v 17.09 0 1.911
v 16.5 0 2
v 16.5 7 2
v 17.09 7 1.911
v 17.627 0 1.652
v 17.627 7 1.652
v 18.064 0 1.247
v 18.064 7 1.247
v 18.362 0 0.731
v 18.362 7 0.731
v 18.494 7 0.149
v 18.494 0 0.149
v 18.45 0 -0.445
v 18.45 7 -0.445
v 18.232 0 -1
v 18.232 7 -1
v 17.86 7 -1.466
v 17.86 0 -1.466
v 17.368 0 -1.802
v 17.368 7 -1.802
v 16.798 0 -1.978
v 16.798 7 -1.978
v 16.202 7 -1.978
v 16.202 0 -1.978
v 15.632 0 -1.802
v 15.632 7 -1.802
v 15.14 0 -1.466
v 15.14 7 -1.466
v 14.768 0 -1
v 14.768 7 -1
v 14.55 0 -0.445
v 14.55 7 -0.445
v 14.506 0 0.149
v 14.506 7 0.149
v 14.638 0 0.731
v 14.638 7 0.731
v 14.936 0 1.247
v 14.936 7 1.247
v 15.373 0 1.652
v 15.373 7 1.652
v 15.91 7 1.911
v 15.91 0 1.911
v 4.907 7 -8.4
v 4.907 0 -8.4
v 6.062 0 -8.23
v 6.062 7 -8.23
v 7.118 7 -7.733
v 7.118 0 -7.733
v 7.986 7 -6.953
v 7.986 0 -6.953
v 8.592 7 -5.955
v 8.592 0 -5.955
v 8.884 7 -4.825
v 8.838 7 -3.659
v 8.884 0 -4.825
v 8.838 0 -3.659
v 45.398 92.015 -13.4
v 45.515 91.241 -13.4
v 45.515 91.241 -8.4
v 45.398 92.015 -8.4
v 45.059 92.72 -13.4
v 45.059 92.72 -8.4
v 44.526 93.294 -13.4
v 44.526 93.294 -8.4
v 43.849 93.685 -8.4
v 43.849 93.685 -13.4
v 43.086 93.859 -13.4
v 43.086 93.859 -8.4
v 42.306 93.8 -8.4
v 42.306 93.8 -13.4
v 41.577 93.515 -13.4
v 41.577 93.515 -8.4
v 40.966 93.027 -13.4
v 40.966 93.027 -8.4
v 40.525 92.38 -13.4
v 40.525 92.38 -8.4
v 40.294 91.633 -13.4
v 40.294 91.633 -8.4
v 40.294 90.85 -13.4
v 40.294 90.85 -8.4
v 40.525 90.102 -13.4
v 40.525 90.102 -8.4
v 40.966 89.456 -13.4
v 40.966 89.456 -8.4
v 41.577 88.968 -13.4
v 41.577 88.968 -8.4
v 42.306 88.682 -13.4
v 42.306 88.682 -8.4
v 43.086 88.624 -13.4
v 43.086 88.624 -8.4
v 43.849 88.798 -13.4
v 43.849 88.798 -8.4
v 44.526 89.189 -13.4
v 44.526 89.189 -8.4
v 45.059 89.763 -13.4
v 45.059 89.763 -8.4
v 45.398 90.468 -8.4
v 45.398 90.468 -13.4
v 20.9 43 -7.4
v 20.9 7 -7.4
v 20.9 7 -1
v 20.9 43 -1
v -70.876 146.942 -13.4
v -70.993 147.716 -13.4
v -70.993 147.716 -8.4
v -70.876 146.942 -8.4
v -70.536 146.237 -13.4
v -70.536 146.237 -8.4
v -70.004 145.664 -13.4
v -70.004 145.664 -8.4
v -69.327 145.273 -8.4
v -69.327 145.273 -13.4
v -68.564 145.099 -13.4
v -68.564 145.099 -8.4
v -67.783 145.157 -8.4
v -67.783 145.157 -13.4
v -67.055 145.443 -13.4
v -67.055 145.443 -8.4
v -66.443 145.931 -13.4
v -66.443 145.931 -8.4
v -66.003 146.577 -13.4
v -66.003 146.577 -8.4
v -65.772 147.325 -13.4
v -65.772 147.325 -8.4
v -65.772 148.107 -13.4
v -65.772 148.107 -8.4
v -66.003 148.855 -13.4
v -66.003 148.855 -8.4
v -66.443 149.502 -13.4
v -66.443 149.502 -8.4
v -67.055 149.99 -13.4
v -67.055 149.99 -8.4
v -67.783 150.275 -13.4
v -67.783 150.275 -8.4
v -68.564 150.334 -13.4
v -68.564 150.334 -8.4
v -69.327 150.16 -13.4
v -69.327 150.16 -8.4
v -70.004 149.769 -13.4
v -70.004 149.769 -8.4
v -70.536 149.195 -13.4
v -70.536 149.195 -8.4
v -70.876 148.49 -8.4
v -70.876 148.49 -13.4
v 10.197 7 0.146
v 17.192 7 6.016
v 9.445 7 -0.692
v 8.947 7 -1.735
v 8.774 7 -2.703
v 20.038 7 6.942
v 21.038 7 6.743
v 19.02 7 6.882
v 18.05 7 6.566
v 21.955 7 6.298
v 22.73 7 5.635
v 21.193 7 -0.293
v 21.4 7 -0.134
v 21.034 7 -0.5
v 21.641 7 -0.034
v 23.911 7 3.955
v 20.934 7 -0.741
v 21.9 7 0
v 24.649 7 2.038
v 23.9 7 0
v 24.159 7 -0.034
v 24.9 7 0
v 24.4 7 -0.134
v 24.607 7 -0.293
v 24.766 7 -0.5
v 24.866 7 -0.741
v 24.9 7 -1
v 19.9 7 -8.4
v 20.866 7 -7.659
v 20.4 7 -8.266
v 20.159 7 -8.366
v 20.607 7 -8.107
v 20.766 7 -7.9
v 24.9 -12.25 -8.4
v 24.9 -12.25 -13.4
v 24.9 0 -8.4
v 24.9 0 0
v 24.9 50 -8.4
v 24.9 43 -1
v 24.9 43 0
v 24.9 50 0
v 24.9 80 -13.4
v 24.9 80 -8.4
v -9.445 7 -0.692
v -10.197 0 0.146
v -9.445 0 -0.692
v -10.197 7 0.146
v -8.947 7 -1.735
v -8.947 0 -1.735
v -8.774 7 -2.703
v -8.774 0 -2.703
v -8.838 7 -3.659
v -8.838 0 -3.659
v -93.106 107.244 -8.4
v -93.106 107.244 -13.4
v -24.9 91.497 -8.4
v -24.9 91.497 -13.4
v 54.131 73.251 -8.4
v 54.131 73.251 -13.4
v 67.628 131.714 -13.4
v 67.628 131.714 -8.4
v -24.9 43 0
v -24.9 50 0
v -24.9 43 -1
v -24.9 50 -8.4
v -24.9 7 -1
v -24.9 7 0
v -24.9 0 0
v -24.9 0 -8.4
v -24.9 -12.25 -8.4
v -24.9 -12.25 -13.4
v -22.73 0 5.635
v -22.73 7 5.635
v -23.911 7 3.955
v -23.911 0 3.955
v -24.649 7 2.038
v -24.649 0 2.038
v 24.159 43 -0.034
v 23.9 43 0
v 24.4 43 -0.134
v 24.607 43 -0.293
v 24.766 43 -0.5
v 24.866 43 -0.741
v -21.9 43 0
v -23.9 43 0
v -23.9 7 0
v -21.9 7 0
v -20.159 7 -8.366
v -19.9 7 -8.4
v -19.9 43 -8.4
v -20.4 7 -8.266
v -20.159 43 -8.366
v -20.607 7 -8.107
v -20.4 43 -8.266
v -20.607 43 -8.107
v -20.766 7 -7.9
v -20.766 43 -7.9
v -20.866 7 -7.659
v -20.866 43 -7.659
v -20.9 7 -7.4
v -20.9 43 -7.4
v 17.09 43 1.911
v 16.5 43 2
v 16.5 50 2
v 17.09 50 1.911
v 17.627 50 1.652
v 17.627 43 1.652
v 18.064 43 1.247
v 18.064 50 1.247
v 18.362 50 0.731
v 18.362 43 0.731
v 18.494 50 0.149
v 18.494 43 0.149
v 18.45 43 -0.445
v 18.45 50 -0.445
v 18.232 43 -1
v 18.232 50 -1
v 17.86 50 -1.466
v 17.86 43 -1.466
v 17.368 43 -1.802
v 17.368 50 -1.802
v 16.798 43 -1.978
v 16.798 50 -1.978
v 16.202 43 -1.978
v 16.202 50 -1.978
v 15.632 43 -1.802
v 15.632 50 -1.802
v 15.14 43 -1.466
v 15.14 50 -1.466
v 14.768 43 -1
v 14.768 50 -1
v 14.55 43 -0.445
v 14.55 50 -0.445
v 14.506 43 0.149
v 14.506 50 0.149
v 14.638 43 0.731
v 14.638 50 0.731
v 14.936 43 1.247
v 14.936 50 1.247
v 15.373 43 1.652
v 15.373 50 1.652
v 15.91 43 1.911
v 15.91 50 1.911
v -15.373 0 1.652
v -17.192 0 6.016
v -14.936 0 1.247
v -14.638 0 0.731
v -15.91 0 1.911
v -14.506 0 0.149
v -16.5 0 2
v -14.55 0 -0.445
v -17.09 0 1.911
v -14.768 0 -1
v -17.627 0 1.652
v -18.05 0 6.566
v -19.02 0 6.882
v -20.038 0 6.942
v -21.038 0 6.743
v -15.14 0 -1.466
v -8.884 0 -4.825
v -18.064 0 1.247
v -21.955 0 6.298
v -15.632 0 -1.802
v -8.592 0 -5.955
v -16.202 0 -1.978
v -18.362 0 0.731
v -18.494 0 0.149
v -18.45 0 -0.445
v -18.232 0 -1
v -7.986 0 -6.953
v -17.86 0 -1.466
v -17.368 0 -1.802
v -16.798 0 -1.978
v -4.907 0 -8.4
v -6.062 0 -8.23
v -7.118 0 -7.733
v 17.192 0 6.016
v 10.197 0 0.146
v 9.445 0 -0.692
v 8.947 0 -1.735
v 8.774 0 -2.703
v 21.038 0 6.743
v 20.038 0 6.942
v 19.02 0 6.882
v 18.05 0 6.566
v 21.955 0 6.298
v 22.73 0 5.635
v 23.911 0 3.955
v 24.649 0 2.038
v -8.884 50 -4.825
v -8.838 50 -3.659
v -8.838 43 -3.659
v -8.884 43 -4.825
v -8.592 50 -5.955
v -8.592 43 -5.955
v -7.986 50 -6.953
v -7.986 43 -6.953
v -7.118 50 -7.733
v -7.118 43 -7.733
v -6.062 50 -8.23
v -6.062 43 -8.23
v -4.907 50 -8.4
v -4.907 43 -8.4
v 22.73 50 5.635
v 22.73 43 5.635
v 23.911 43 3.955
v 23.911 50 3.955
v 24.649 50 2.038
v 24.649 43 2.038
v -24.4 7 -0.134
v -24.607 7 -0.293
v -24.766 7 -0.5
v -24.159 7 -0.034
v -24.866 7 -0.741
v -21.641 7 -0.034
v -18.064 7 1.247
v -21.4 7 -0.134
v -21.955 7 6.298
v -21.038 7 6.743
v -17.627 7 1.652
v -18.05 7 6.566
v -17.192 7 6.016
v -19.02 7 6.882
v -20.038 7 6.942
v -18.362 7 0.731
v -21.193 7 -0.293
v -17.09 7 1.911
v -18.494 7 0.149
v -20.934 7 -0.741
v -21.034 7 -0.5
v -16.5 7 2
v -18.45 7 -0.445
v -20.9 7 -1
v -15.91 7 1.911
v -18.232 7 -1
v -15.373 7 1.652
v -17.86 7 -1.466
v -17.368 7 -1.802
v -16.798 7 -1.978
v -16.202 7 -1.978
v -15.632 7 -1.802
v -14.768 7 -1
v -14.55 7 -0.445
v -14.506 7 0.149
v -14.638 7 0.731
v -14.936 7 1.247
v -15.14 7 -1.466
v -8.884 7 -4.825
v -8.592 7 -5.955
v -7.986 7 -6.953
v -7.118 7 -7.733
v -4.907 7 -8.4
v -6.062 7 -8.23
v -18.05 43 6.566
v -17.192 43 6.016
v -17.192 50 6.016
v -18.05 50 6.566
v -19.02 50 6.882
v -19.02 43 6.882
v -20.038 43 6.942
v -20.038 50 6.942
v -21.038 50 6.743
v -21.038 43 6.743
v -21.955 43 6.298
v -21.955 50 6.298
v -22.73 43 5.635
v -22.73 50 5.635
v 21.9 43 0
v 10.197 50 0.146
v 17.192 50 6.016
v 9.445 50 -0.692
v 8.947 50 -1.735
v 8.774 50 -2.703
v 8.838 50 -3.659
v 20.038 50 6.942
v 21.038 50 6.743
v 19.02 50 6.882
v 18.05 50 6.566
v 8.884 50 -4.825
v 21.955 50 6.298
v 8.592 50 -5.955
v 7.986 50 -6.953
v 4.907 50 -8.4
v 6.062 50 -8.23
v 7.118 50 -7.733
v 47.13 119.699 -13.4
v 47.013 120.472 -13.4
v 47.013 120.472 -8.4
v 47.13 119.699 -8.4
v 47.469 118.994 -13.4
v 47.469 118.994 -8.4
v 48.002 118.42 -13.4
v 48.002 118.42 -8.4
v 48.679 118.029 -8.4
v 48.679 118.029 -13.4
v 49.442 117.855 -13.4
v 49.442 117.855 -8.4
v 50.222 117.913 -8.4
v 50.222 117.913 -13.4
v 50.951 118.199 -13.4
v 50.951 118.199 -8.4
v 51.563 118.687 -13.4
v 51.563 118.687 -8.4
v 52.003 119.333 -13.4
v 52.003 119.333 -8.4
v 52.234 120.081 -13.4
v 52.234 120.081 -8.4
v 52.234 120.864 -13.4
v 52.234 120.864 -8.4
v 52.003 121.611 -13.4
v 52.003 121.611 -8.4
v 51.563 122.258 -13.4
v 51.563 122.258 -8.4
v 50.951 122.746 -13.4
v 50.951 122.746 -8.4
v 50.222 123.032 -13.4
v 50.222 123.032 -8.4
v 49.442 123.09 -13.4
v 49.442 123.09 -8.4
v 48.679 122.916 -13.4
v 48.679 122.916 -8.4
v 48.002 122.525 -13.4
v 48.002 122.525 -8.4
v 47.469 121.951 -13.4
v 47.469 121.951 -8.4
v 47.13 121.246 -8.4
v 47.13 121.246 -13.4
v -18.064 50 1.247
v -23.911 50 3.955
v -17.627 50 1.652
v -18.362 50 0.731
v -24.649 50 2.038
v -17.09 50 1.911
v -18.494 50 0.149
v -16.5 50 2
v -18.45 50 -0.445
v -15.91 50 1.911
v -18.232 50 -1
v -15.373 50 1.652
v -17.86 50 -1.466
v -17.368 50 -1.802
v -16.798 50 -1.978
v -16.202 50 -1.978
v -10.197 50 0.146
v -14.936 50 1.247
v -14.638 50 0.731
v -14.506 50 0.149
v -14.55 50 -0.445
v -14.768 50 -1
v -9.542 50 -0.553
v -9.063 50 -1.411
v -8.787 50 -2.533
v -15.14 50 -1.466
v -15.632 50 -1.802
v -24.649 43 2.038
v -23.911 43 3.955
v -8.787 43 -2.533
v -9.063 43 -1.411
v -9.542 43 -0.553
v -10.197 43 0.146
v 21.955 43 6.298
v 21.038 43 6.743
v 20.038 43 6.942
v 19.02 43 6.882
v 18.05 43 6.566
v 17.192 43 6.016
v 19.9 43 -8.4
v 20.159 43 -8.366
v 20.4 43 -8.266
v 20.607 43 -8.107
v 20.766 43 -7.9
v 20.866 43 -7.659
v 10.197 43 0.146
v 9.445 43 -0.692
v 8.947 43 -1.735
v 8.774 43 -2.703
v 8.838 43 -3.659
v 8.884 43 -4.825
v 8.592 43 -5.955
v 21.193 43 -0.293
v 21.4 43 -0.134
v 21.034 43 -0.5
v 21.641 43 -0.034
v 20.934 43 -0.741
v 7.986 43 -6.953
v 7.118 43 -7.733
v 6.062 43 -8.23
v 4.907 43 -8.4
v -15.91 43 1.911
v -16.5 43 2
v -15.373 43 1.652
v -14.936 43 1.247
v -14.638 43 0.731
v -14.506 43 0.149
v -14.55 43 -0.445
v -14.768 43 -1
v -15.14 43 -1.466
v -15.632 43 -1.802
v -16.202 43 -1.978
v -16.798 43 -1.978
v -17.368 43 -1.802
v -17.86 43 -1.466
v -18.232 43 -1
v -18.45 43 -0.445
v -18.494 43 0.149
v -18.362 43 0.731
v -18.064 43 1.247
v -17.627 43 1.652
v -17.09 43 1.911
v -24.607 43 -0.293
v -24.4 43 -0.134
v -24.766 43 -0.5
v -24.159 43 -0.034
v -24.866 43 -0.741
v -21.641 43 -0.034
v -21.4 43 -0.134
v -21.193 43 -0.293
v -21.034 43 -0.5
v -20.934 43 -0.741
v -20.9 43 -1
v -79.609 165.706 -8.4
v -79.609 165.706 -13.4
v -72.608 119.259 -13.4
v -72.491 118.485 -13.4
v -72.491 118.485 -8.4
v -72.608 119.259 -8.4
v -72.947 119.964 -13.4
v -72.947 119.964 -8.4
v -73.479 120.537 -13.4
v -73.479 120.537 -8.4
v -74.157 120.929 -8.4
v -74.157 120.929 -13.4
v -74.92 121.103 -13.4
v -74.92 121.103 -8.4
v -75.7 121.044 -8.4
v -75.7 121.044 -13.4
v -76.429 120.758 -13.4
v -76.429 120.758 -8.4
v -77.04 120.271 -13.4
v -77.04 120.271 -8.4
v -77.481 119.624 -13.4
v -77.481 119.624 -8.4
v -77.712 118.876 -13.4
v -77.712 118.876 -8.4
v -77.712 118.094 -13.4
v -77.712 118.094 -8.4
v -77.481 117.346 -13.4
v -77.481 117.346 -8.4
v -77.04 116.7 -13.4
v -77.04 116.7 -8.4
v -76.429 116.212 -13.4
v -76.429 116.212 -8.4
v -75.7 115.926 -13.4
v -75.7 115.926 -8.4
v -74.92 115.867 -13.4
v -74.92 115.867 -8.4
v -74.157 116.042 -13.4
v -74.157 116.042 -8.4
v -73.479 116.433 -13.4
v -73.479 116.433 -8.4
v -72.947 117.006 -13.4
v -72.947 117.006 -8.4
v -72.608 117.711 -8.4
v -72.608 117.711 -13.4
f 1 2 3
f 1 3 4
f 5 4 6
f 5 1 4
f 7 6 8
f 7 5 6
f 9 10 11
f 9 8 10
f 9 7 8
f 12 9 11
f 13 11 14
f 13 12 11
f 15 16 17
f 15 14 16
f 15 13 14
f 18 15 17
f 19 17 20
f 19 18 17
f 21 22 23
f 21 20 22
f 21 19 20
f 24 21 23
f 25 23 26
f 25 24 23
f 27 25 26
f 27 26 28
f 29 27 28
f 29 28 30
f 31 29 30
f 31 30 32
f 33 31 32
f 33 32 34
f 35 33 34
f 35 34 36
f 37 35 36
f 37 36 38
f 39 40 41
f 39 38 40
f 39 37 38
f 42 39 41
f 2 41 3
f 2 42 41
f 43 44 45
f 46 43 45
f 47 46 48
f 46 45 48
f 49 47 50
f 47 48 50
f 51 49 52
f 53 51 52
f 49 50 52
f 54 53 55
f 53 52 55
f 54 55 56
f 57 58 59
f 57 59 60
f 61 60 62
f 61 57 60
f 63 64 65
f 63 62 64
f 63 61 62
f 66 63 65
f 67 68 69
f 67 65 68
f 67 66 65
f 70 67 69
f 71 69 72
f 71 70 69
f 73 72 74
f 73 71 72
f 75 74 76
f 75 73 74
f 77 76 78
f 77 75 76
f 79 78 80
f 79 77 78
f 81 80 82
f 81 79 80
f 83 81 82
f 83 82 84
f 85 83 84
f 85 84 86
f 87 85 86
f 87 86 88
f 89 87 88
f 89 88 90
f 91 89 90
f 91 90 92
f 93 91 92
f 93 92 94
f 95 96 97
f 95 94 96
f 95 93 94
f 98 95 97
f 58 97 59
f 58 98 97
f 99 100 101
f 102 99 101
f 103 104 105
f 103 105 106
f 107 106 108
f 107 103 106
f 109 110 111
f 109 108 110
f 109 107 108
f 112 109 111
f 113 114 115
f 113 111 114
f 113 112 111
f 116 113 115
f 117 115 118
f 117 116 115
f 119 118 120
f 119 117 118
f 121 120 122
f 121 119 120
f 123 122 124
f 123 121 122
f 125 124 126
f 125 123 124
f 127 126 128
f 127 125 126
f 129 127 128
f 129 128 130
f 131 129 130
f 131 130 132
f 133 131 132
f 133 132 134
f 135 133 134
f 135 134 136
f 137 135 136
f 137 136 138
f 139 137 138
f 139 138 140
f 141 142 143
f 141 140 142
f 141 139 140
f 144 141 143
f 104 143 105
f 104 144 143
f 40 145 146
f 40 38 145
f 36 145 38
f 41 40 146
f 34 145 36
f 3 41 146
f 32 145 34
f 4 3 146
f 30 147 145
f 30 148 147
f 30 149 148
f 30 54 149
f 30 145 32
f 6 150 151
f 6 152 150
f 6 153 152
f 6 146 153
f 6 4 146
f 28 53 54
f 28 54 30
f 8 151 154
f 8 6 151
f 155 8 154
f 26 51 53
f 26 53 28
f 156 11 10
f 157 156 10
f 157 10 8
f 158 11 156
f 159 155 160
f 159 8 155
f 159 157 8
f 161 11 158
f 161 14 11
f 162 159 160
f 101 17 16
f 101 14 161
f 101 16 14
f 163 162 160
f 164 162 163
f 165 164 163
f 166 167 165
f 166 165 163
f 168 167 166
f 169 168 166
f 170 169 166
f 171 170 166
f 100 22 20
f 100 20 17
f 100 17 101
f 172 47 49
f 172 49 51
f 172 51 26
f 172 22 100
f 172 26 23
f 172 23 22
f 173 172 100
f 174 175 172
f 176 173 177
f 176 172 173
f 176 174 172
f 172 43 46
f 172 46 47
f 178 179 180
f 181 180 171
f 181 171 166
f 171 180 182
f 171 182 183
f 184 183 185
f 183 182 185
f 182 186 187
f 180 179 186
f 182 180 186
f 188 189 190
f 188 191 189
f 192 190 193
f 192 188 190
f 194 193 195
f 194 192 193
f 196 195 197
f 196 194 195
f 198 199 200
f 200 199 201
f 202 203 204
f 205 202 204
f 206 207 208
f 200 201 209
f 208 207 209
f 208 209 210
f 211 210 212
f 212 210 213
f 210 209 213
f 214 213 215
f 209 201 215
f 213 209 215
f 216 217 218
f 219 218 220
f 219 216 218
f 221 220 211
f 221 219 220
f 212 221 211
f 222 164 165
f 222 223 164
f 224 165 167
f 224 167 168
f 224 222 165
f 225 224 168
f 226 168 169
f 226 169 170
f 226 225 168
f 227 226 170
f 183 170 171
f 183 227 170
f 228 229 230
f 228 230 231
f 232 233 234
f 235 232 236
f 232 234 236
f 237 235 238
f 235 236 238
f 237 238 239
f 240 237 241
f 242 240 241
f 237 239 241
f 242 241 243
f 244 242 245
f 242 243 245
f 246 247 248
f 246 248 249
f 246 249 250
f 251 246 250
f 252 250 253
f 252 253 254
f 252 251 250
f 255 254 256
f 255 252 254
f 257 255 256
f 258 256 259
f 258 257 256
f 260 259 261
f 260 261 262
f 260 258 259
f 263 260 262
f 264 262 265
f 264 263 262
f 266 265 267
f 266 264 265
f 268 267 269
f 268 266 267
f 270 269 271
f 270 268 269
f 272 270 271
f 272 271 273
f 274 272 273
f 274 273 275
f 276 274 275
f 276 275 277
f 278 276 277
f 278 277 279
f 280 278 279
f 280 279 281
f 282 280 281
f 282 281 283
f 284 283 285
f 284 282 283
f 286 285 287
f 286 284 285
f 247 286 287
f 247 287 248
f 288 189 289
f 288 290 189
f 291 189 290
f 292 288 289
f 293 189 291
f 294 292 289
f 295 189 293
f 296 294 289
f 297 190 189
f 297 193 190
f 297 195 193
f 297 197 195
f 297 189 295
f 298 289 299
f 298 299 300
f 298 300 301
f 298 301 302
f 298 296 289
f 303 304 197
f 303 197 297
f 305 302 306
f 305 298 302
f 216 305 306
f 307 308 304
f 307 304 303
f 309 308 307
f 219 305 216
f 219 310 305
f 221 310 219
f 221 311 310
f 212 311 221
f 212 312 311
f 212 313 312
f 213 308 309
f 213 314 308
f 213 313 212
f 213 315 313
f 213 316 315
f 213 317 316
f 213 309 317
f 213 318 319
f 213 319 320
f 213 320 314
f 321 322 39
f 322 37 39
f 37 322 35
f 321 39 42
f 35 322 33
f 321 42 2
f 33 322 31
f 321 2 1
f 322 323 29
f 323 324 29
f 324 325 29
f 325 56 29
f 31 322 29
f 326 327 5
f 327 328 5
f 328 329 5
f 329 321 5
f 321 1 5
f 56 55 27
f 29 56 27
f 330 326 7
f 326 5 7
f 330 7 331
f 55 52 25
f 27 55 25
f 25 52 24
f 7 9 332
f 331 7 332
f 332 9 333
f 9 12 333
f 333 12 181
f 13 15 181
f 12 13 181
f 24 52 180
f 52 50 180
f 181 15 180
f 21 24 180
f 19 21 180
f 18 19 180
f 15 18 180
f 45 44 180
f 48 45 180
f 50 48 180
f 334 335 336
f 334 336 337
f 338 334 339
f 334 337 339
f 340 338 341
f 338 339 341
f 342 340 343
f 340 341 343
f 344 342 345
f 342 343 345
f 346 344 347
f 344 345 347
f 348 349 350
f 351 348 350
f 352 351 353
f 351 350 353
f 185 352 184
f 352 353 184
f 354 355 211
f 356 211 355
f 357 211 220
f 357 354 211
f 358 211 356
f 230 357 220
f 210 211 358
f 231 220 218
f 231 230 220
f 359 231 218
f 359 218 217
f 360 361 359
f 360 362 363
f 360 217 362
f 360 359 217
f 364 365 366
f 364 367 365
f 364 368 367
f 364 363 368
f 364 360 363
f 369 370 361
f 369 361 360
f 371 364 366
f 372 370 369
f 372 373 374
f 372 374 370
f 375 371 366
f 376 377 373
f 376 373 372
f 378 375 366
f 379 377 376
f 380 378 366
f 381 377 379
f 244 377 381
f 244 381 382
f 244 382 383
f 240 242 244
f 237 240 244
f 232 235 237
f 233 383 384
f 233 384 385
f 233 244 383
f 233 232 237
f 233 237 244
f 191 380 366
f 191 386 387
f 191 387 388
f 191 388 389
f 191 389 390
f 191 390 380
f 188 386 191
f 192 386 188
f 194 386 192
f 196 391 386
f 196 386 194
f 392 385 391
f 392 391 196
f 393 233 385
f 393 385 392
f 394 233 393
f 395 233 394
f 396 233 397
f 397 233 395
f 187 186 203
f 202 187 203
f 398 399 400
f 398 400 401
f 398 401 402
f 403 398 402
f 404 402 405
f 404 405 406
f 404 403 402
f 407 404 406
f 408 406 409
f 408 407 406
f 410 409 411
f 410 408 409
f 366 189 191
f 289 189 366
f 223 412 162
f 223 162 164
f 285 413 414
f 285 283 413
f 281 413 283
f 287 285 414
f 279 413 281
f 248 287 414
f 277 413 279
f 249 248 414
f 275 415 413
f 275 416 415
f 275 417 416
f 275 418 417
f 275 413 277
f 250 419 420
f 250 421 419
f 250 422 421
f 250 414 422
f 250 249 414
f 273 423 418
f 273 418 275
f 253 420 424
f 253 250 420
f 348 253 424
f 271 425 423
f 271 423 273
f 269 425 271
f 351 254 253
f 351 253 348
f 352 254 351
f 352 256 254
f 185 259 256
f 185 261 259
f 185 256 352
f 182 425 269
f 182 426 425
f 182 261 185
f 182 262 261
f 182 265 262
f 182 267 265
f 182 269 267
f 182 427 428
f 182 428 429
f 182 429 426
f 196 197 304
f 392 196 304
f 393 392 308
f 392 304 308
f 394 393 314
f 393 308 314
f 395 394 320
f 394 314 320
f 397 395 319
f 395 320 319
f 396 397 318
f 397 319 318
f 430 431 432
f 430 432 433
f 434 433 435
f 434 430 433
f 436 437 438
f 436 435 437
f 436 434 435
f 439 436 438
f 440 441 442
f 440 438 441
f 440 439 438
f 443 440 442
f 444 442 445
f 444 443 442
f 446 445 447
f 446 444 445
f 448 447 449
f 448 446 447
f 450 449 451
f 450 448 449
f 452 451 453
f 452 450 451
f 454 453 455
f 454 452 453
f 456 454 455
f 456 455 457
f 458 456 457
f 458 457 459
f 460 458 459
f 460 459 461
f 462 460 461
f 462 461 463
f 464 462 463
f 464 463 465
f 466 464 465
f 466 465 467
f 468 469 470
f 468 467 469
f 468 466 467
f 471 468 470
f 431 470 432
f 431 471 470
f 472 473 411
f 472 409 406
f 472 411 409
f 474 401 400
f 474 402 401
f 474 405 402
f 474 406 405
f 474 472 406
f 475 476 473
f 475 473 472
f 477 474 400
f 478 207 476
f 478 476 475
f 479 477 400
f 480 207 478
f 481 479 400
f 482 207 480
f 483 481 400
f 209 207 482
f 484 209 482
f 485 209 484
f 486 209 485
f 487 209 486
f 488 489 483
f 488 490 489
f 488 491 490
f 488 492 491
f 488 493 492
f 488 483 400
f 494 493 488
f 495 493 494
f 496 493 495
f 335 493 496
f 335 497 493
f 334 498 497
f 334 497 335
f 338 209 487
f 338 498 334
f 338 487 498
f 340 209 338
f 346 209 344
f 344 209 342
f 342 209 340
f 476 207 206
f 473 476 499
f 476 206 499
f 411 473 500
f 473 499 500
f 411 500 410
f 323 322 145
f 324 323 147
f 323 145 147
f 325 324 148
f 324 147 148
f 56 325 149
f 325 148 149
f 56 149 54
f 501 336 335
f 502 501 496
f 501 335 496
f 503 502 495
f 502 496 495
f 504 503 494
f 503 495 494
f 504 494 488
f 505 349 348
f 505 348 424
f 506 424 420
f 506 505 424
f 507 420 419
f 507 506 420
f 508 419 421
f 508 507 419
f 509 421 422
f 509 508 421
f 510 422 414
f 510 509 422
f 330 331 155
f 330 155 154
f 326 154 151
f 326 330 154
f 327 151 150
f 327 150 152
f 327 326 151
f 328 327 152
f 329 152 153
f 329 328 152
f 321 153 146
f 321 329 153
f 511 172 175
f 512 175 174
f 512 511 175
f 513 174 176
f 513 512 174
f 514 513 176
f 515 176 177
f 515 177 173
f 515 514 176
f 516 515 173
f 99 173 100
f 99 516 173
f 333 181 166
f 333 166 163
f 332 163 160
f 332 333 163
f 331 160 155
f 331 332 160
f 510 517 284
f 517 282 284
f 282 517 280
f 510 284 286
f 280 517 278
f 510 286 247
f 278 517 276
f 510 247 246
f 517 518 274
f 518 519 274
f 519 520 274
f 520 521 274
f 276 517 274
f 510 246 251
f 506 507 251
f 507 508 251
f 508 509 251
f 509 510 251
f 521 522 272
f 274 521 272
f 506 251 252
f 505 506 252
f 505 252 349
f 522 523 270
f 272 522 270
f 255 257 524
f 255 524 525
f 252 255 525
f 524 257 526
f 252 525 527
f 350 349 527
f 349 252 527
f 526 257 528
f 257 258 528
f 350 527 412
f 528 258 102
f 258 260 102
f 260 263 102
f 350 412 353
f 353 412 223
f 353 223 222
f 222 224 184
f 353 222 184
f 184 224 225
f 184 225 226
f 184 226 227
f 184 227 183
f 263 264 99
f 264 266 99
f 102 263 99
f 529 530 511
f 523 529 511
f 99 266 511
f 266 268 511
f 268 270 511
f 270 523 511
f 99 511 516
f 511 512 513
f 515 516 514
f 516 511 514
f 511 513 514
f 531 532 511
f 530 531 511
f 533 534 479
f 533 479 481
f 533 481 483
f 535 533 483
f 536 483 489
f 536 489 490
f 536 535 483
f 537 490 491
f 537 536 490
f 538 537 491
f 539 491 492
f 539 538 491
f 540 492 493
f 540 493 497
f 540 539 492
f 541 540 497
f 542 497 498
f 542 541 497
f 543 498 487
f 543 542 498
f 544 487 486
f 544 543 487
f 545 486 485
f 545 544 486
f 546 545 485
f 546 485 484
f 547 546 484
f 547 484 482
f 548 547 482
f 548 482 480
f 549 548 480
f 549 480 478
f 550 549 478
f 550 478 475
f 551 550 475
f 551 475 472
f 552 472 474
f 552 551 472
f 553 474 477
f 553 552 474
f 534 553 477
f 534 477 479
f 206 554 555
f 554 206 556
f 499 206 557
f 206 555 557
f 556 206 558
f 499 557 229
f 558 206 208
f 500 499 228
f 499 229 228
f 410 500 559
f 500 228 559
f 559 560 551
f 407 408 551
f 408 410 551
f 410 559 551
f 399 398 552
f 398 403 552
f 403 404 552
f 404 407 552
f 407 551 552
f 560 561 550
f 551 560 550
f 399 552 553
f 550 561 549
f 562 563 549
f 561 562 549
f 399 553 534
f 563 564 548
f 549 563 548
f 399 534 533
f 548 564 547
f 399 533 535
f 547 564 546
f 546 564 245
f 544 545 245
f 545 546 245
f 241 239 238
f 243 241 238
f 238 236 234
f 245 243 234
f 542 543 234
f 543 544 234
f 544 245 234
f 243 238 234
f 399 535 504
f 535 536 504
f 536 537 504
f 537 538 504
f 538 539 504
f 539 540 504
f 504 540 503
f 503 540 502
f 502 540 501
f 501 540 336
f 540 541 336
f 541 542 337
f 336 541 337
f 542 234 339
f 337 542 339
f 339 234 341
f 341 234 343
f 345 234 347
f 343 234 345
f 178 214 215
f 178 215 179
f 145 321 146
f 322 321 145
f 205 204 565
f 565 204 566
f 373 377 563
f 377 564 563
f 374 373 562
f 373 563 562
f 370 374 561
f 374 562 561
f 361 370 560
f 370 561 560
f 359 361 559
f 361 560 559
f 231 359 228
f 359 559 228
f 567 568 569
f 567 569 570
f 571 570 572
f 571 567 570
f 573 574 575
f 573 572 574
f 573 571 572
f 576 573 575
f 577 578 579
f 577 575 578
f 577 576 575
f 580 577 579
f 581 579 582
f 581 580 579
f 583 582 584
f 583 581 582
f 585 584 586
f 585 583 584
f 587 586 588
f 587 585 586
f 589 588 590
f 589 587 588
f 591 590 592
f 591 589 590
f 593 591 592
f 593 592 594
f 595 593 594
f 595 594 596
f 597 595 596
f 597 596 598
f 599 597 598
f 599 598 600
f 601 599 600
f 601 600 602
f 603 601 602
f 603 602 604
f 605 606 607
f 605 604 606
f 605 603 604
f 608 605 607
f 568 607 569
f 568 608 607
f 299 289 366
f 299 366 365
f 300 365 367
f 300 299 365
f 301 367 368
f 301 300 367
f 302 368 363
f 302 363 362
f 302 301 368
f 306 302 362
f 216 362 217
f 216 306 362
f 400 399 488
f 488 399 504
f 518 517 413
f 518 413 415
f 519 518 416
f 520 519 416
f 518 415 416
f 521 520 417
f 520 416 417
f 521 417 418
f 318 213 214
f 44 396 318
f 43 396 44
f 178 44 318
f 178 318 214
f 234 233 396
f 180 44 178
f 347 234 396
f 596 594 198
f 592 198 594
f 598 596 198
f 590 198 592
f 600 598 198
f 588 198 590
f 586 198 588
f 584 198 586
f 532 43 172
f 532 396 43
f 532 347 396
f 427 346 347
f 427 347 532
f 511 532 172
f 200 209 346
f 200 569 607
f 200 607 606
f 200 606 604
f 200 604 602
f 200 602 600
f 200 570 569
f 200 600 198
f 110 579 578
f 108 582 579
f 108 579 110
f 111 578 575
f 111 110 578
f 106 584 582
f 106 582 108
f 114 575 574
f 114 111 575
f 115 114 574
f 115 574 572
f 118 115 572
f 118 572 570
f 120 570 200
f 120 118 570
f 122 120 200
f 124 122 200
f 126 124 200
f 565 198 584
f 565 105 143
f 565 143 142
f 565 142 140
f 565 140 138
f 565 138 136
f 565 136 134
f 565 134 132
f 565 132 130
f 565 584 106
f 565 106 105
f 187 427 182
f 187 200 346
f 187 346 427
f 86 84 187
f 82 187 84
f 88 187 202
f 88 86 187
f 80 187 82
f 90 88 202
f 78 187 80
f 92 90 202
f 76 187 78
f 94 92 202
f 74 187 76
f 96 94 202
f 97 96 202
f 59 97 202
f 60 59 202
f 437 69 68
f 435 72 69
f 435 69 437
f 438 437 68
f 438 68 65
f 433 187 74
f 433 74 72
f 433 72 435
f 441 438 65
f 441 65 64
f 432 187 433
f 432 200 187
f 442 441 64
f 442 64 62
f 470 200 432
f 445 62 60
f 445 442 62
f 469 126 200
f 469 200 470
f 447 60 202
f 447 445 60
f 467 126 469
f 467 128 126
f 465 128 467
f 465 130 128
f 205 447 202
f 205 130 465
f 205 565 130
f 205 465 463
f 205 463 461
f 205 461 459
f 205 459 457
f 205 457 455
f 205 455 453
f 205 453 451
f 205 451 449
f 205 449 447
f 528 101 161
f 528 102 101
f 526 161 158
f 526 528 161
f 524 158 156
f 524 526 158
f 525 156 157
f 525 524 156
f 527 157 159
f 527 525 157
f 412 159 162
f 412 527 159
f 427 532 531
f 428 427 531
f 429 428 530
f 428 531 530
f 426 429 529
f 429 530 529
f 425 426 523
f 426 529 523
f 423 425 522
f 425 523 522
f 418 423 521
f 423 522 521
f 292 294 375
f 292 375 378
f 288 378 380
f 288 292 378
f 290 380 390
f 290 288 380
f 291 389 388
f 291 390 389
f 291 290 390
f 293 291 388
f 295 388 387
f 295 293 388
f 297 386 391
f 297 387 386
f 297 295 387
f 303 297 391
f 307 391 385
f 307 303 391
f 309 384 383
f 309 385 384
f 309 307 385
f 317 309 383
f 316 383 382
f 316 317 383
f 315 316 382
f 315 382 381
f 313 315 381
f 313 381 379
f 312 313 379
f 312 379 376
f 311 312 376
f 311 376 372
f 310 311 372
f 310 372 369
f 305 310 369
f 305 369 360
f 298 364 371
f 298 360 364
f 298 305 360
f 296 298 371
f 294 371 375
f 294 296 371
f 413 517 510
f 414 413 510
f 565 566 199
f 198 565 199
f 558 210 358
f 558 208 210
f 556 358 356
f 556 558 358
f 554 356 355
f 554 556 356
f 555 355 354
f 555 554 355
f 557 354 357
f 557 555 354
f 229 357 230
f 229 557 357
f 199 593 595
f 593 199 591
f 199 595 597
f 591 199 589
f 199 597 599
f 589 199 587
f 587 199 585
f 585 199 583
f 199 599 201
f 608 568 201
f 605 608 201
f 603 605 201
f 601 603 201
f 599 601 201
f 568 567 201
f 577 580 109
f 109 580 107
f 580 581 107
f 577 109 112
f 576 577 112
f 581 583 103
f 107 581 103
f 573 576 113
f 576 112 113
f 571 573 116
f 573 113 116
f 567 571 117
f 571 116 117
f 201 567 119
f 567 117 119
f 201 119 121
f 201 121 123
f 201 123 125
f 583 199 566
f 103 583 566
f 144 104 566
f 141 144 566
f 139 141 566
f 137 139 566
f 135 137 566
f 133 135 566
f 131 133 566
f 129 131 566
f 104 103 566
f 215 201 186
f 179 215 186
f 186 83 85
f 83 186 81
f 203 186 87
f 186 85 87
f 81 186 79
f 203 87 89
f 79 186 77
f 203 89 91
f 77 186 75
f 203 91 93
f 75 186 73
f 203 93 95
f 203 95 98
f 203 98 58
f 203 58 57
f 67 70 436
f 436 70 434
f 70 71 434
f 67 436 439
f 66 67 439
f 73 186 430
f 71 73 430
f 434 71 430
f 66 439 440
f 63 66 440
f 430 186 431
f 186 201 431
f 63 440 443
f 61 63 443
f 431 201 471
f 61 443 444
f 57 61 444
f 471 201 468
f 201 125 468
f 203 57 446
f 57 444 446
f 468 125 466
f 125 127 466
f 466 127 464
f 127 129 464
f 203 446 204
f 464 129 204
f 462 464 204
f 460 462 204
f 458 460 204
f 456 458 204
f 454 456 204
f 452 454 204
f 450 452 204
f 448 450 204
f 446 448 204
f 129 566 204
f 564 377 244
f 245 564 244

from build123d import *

# Parameters (mm, degrees)
BOSS_EXTRUDE2_DEPTH     = 7
CUT_EXTRUDE2_DEPTH      = 30.130224853
CUT_EXTRUDE2_DEPTH_BACK = 30.130224853
SKETCH3_R               = 2
BOSS_EXTRUDE3_DEPTH     = 36
SKETCH5_R               = 2
BOSS_EXTRUDE4_DEPTH     = 7
SKETCH14_W              = 49.8
SKETCH14_H              = 5
BOSS_EXTRUDE7_DEPTH     = 30
SKETCH16_W              = 49.8
SKETCH16_H              = 5
BOSS_EXTRUDE8_DEPTH     = 12.25
BOSS_EXTRUDE9_DEPTH     = 5
FILLET1_DEPTH           = 50
FILLET1_2_DEPTH         = 7
FILLET1_START           = 43
FILLET1_3_DEPTH         = 7
FILLET2_R               = 4
FILLET3_R               = 1
CUT_EXTRUDE3_DEPTH      = 191.690493415
CUT_EXTRUDE3_DEPTH_BACK = 191.690493415
SKETCH19_R              = 2.625


with BuildPart() as part:
    # Sketch1 → Boss-Extrude2 (new body)
    with BuildSketch(Plane(origin=(0, 0, 0), x_dir=(1, 0, 0), z_dir=(0, 1, 0))):
        with BuildLine():
            Line((-24.9, 0), (-24.9, 13.4))
            Line((-24.9, 13.4), (24.9, 13.4))
            Line((24.9, 13.4), (24.9, 0))
            ThreePointArc((24.9, 0), (23.392904185, -4.800819919), (19.412411454, -7.878950407))
            Line((19.412411454, -7.878950407), (8.235013612, 1.5))
            ThreePointArc((8.235013612, 1.5), (11.116692467, 6.448255578), (16.5, 8.4))
            Line((16.5, 8.4), (-16.5, 8.4))
            ThreePointArc((-16.5, 8.4), (-11.116692467, 6.448255578), (-8.235013612, 1.5))
            Line((-8.235013612, 1.5), (-19.412411454, -7.878950407))
            ThreePointArc((-19.412411454, -7.878950407), (-23.392904185, -4.800819919), (-24.9, 0))
        make_face()
    extrude(amount=BOSS_EXTRUDE2_DEPTH)

    # Sketch3 → Cut-Extrude2 (cut, two sides: drawn at the far end of the back side and taken through both)
    with BuildSketch(Plane(origin=(0, 7, 0), x_dir=(1, 0, 0), z_dir=(0, 1, 0)).offset(-CUT_EXTRUDE2_DEPTH_BACK)):
        with Locations(Location((-16.5, 0, 0), (0, 0, 270))):
            Circle(SKETCH3_R)
        with Locations(Location((16.5, 0, 0), (0, 0, 270))):
            Circle(SKETCH3_R)
    extrude(amount=CUT_EXTRUDE2_DEPTH + CUT_EXTRUDE2_DEPTH_BACK, mode=Mode.SUBTRACT)

    # Sketch4 → Boss-Extrude3 (add)
    with BuildSketch(Plane(origin=(0, 7, 0), x_dir=(1, 0, 0), z_dir=(0, 1, 0))):
        Polygon((-24.9, 13.4), (-24.9, 0), (-20.9, 0), (-20.9, 8.4), (-16.5, 8.4), (16.5, 8.4), (20.9, 8.4), (20.9, 0), (24.9, 0), (24.9, 13.4), align=None)
    extrude(amount=BOSS_EXTRUDE3_DEPTH)

    # Sketch5 → Boss-Extrude4 (add)
    with BuildSketch(Plane(origin=(0, 43, 0), x_dir=(1, 0, 0), z_dir=(0, 1, 0))):
        with BuildLine():
            Line((-24.9, 13.4), (-24.9, 0))
            ThreePointArc((-24.9, 0), (-23.392904185, -4.800819919), (-19.412411454, -7.878950407))
            Line((-19.412411454, -7.878950407), (-8.235013612, 1.5))
            ThreePointArc((-8.235013612, 1.5), (-11.116692467, 6.448255578), (-16.5, 8.4))
            Line((-16.5, 8.4), (16.5, 8.4))
            ThreePointArc((16.5, 8.4), (11.116692467, 6.448255578), (8.235013612, 1.5))
            Line((8.235013612, 1.5), (19.412411454, -7.878950407))
            ThreePointArc((19.412411454, -7.878950407), (23.392904185, -4.800819919), (24.9, 0))
            Line((24.9, 0), (24.9, 13.4))
            Line((24.9, 13.4), (-24.9, 13.4))
        make_face()
        with Locations(Location((16.5, 0, 0), (0, 0, 270))):
            Circle(SKETCH5_R, mode=Mode.SUBTRACT)
        with Locations(Location((-16.5, 0, 0), (0, 0, 270))):
            Circle(SKETCH5_R, mode=Mode.SUBTRACT)
    extrude(amount=BOSS_EXTRUDE4_DEPTH)

    # Sketch14 → Boss-Extrude7 (add)
    with BuildSketch(Plane(origin=(0, 50, 0), x_dir=(1, 0, 0), z_dir=(0, 1, 0))):
        with Locations((0, 10.9)):
            Rectangle(SKETCH14_W, SKETCH14_H)
    extrude(amount=BOSS_EXTRUDE7_DEPTH)

    # Sketch16 → Boss-Extrude8 (add)
    with BuildSketch(Plane.XZ):
        with Locations((0, -10.9)):
            Rectangle(SKETCH16_W, SKETCH16_H)
    extrude(amount=BOSS_EXTRUDE8_DEPTH)

    # Sketch17 → Boss-Extrude9 (add)
    with BuildSketch(Plane(origin=(0, 0, -13.4), x_dir=(-1, 0, 0), z_dir=(0, 0, -1))):
        Polygon((24.9, 80), (-24.9, 80), (-54.131101944, 73.25146837), (-67.628165204, 131.713672257), (79.608841274, 165.706013609), (93.105904535, 107.243809722), (24.9, 91.497235918), align=None)
    extrude(amount=-BOSS_EXTRUDE9_DEPTH)

    # Fillet1: read off the stored shape, not the designer's step
    # Fillet1 outline → Fillet1 (cut)
    with BuildSketch(Plane(origin=(0, 0, 0), x_dir=(1, 0, 0), z_dir=(0, 1, 0))):
        with BuildLine():
            Line((-19.412411454, -7.878950407), (-17.191978394, -6.015785846))
            ThreePointArc((-17.191978394, -6.015785846), (-20.037614317, -6.942179175), (-22.729609591, -5.63488814))
            ThreePointArc((-22.729609591, -5.63488814), (-21.206707029, -6.957507379), (-19.412411454, -7.878950407))
        make_face()
        with BuildLine():
            ThreePointArc((22.729609591, -5.63488814), (20.037614317, -6.942179175), (17.191978394, -6.015785846))
            Line((17.191978394, -6.015785846), (19.412411454, -7.878950407))
            ThreePointArc((19.412411454, -7.878950407), (21.206707029, -6.957507379), (22.729609591, -5.63488814))
        make_face()
    extrude(amount=FILLET1_DEPTH, mode=Mode.SUBTRACT)

    # Fillet1 2 outline → Fillet1 2 (add)
    with BuildSketch(Plane(origin=(0, 0, 0), x_dir=(1, 0, 0), z_dir=(0, 1, 0))):
        with BuildLine():
            Line((16.5, 8.4), (4.906898603, 8.4))
            ThreePointArc((4.906898603, 8.4), (8.19911817, 6.671847337), (8.646608731, 2.980645161))
            ThreePointArc((8.646608731, 2.980645161), (11.729120592, 6.91366109), (16.5, 8.4))
        make_face()
        with BuildLine():
            ThreePointArc((-16.5, 8.4), (-11.729120592, 6.91366109), (-8.646608731, 2.980645161))
            ThreePointArc((-8.646608731, 2.980645161), (-8.19911817, 6.671847337), (-4.906898603, 8.4))
            Line((-4.906898603, 8.4), (-16.5, 8.4))
        make_face()
    extrude(amount=FILLET1_2_DEPTH)

    # Fillet1 3 outline → Fillet1 3 (add)
    with BuildSketch(Plane(origin=(0, 0, 0), x_dir=(1, 0, 0), z_dir=(0, 1, 0)).offset(FILLET1_START)):
        with BuildLine():
            Line((16.5, 8.4), (4.906898603, 8.4))
            ThreePointArc((4.906898603, 8.4), (8.19911817, 6.671847337), (8.646608731, 2.980645161))
            ThreePointArc((8.646608731, 2.980645161), (11.729120592, 6.91366109), (16.5, 8.4))
        make_face()
        with BuildLine():
            ThreePointArc((-16.5, 8.4), (-11.729120592, 6.91366109), (-8.646608731, 2.980645161))
            ThreePointArc((-8.646608731, 2.980645161), (-8.19911817, 6.671847337), (-4.906898603, 8.4))
            Line((-4.906898603, 8.4), (-16.5, 8.4))
        make_face()
    extrude(amount=FILLET1_3_DEPTH)

    # Fillet2
    fillet2_edges = [part.edges().sort_by_distance(p)[0] for p in [
        (8.235013612, 46.5, -1.5),
        (-8.235013612, 46.5, -1.5),
        (8.235013612, 3.5, -1.5),
        (-8.235013612, 3.5, -1.5),
    ]]
    fillet(fillet2_edges, radius=FILLET2_R)

    # Fillet3
    fillet3_edges = [part.edges().sort_by_distance(p)[0] for p in [
        (-24.9, 25, 0),
        (-20.9, 25, 0),
        (-20.9, 25, -8.4),
        (20.9, 25, -8.4),
        (20.9, 25, 0),
        (24.9, 25, 0),
    ]]
    fillet(fillet3_edges, radius=FILLET3_R)

    # Sketch19 → Cut-Extrude3 (cut, two sides: drawn at the far end of the back side and taken through both)
    with BuildSketch(Plane.XY.offset(-8.4).offset(-CUT_EXTRUDE3_DEPTH_BACK)):
        with Locations((-75.116087748, 118.485094879)):
            Circle(SKETCH19_R)
        with Locations((42.889816787, 91.241285157)):
            Circle(SKETCH19_R)
        with Locations(Location((49.638348417, 120.4723871, 0), (0, 0, 180))):
            Circle(SKETCH19_R)
        with Locations(Location((-68.367556118, 147.716196822, 0), (0, 0, 180))):
            Circle(SKETCH19_R)
    extrude(amount=CUT_EXTRUDE3_DEPTH + CUT_EXTRUDE3_DEPTH_BACK, mode=Mode.SUBTRACT)


solid = part.part
